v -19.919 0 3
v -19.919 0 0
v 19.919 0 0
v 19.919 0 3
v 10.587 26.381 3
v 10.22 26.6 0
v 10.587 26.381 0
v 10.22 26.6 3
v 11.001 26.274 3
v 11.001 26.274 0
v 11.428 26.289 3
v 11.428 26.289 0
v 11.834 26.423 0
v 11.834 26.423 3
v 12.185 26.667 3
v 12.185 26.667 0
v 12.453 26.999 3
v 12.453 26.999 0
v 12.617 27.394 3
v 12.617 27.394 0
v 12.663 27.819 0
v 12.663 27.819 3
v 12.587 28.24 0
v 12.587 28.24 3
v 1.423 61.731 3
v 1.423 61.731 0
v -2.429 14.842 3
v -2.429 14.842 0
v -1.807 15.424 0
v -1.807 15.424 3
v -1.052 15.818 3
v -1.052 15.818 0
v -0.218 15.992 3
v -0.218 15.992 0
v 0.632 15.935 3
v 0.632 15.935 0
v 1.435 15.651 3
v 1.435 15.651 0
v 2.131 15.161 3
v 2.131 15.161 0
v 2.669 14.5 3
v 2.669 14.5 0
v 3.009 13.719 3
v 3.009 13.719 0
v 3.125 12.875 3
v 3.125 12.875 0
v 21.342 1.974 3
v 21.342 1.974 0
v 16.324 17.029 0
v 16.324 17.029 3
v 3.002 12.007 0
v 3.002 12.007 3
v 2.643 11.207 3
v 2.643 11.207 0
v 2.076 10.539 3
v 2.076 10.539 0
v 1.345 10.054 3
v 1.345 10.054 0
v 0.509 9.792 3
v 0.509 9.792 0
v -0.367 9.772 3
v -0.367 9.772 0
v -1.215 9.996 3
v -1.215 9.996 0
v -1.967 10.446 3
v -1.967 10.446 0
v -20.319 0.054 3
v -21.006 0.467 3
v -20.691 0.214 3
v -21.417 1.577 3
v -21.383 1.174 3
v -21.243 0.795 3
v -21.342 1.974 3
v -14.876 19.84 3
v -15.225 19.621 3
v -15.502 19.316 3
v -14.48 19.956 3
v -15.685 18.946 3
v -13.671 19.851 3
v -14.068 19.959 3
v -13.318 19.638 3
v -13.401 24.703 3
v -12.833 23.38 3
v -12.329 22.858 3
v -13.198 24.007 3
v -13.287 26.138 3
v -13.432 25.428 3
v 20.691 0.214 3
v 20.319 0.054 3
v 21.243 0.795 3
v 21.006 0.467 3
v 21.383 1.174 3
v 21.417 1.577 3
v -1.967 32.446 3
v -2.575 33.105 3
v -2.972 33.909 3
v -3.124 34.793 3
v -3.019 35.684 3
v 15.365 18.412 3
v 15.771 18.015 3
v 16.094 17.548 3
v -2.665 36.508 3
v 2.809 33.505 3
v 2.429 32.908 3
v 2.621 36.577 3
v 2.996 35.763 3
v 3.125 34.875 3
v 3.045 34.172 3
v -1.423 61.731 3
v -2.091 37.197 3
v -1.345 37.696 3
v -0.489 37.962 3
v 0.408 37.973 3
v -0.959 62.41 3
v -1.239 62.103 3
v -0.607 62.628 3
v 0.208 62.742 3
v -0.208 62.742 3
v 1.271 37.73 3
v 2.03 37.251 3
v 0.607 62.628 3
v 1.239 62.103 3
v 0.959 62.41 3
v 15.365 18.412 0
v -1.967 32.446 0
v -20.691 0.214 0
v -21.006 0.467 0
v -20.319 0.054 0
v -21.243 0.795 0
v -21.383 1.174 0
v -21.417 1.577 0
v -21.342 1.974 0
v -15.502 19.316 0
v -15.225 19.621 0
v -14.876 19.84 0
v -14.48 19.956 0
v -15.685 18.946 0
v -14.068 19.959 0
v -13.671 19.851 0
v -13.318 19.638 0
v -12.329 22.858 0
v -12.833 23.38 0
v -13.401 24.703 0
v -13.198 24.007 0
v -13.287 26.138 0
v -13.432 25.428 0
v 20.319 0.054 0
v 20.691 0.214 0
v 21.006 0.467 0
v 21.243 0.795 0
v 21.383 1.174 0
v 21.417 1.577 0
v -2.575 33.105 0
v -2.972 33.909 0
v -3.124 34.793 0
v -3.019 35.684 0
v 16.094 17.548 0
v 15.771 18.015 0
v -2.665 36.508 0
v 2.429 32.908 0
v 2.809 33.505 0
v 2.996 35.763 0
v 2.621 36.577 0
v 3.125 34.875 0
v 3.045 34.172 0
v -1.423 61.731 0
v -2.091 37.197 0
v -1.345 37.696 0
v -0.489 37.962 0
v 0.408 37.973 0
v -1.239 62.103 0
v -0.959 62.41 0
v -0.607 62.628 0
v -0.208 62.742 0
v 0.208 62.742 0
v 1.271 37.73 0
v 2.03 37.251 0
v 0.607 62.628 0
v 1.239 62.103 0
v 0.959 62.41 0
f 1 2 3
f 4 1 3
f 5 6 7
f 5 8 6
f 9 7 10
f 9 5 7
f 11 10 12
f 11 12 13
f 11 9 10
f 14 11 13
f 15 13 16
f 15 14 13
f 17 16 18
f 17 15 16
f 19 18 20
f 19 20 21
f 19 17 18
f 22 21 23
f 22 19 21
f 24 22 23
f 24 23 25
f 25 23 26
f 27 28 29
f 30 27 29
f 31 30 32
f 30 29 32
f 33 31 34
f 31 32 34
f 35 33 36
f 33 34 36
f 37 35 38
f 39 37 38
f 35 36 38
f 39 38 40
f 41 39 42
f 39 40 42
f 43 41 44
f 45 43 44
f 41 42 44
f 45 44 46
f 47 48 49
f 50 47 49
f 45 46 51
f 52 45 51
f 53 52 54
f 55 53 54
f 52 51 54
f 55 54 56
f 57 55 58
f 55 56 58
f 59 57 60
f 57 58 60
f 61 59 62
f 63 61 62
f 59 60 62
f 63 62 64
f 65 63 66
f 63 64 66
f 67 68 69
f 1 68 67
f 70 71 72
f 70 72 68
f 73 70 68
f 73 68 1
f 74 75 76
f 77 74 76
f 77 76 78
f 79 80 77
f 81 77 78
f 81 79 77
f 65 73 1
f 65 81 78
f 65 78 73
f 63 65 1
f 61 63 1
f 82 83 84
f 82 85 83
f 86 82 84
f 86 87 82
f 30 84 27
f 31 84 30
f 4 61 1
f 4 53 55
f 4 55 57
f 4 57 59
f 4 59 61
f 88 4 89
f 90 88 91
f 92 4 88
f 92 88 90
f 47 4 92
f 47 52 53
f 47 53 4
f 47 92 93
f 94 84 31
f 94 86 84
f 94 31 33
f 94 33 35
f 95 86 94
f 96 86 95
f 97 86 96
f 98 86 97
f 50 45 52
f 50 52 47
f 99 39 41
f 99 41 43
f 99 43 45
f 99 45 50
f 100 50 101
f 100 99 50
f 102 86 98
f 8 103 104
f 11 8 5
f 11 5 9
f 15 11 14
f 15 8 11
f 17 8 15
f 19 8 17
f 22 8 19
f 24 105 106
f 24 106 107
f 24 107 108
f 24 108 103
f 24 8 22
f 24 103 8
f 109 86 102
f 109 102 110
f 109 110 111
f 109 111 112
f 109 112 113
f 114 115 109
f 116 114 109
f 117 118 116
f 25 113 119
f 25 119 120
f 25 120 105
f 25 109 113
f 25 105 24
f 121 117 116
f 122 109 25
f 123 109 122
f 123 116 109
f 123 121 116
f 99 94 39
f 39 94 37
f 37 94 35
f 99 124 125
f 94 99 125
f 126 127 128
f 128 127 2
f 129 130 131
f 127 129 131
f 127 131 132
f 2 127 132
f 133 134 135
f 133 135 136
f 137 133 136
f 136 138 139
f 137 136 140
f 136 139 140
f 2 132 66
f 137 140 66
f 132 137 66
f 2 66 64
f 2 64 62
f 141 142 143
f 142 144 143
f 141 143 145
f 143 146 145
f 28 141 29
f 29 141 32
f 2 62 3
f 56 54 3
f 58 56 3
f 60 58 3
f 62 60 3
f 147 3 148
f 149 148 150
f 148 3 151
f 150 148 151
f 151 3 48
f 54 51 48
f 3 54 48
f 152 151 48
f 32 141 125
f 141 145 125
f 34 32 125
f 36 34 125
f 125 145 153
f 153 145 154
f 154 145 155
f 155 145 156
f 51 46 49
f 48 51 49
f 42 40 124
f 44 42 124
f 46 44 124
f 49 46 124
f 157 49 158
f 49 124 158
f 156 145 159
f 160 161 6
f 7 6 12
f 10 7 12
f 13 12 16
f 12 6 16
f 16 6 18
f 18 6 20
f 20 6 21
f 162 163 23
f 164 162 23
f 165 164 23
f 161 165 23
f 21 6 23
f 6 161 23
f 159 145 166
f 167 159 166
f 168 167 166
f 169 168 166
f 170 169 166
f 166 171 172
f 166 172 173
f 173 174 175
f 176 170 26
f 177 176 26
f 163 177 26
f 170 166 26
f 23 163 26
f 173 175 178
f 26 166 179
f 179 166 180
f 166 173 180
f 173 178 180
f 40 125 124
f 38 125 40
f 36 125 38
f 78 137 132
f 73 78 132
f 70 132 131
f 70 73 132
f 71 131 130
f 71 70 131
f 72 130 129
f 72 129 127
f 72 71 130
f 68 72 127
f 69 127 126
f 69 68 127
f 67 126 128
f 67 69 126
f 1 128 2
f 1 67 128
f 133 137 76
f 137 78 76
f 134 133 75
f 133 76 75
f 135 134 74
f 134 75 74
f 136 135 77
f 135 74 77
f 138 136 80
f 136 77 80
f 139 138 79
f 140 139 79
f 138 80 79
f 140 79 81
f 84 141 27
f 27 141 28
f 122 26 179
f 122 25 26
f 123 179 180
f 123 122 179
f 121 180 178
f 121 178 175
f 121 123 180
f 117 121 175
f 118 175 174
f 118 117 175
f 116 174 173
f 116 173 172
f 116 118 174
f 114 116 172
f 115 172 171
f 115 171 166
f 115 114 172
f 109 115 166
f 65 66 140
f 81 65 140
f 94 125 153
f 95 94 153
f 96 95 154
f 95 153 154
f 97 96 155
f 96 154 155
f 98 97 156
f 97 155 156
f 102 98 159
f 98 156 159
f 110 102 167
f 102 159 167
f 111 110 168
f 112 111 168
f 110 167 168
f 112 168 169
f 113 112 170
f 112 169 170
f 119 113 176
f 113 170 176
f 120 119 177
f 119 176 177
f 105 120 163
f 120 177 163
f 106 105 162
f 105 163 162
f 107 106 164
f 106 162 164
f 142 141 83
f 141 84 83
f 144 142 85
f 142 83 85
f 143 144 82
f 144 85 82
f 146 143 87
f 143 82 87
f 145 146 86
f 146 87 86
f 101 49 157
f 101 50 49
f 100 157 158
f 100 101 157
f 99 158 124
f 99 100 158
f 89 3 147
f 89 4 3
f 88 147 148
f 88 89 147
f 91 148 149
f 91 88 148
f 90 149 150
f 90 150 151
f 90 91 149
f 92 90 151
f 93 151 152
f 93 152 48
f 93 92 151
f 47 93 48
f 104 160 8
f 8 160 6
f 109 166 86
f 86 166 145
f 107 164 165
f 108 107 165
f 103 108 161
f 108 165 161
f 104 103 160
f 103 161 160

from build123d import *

# Parameters (mm, degrees)
F1_DEPTH = 3
F2_R     = 1.5
F3_R     = 3


with BuildPart() as f1:
    # F0 (on Top) → F1 (new body)
    with BuildSketch(Plane.XY):
        with BuildLine():
            Line((-15, 21), (-22, 0))
            Line((-22, 0), (22, 0))
            Line((22, 0), (16.046474, 17.860578))
            Line((16.046474, 17.860578), (-1.966555, 32.446361))
            ThreePointArc((-1.966555, 32.446361), (-1.345389, 37.695559), (3.125, 34.875))
            ThreePointArc((3.125, 34.875), (2.94577, 33.831897), (2.428639, 32.908445))
            Line((2.428639, 32.908445), (14.21061, 23.368169))
            Line((14.21061, 23.368169), (0, 66))
            Line((0, 66), (-13.944539, 24.166384))
            Line((-13.944539, 24.166384), (-2.428639, 14.841555))
            ThreePointArc((-2.428639, 14.841555), (1.043103, 15.82077), (3.125, 12.875))
            ThreePointArc((3.125, 12.875), (1.345389, 10.054441), (-1.966555, 10.446361))
            Line((-1.966555, 10.446361), (-15, 21))
        make_face()
    extrude(amount=F1_DEPTH)

    # F2
    f2_edges = [f1.edges().sort_by_distance(p)[0] for p in [
        (-22, 0, 1.5),
        (22, 0, 1.5),
        (14.21061, 23.368169, 1.5),
        (0, 66, 1.5),
        (-15, 21, 1.5),
    ]]
    fillet(f2_edges, radius=F2_R)

    # F3
    f3_edges = [f1.edges().sort_by_distance(p)[0] for p in [
        (-13.944539, 24.166384, 1.5),
        (16.046474, 17.860578, 1.5),
    ]]
    fillet(f3_edges, radius=F3_R)


solid = f1.part
